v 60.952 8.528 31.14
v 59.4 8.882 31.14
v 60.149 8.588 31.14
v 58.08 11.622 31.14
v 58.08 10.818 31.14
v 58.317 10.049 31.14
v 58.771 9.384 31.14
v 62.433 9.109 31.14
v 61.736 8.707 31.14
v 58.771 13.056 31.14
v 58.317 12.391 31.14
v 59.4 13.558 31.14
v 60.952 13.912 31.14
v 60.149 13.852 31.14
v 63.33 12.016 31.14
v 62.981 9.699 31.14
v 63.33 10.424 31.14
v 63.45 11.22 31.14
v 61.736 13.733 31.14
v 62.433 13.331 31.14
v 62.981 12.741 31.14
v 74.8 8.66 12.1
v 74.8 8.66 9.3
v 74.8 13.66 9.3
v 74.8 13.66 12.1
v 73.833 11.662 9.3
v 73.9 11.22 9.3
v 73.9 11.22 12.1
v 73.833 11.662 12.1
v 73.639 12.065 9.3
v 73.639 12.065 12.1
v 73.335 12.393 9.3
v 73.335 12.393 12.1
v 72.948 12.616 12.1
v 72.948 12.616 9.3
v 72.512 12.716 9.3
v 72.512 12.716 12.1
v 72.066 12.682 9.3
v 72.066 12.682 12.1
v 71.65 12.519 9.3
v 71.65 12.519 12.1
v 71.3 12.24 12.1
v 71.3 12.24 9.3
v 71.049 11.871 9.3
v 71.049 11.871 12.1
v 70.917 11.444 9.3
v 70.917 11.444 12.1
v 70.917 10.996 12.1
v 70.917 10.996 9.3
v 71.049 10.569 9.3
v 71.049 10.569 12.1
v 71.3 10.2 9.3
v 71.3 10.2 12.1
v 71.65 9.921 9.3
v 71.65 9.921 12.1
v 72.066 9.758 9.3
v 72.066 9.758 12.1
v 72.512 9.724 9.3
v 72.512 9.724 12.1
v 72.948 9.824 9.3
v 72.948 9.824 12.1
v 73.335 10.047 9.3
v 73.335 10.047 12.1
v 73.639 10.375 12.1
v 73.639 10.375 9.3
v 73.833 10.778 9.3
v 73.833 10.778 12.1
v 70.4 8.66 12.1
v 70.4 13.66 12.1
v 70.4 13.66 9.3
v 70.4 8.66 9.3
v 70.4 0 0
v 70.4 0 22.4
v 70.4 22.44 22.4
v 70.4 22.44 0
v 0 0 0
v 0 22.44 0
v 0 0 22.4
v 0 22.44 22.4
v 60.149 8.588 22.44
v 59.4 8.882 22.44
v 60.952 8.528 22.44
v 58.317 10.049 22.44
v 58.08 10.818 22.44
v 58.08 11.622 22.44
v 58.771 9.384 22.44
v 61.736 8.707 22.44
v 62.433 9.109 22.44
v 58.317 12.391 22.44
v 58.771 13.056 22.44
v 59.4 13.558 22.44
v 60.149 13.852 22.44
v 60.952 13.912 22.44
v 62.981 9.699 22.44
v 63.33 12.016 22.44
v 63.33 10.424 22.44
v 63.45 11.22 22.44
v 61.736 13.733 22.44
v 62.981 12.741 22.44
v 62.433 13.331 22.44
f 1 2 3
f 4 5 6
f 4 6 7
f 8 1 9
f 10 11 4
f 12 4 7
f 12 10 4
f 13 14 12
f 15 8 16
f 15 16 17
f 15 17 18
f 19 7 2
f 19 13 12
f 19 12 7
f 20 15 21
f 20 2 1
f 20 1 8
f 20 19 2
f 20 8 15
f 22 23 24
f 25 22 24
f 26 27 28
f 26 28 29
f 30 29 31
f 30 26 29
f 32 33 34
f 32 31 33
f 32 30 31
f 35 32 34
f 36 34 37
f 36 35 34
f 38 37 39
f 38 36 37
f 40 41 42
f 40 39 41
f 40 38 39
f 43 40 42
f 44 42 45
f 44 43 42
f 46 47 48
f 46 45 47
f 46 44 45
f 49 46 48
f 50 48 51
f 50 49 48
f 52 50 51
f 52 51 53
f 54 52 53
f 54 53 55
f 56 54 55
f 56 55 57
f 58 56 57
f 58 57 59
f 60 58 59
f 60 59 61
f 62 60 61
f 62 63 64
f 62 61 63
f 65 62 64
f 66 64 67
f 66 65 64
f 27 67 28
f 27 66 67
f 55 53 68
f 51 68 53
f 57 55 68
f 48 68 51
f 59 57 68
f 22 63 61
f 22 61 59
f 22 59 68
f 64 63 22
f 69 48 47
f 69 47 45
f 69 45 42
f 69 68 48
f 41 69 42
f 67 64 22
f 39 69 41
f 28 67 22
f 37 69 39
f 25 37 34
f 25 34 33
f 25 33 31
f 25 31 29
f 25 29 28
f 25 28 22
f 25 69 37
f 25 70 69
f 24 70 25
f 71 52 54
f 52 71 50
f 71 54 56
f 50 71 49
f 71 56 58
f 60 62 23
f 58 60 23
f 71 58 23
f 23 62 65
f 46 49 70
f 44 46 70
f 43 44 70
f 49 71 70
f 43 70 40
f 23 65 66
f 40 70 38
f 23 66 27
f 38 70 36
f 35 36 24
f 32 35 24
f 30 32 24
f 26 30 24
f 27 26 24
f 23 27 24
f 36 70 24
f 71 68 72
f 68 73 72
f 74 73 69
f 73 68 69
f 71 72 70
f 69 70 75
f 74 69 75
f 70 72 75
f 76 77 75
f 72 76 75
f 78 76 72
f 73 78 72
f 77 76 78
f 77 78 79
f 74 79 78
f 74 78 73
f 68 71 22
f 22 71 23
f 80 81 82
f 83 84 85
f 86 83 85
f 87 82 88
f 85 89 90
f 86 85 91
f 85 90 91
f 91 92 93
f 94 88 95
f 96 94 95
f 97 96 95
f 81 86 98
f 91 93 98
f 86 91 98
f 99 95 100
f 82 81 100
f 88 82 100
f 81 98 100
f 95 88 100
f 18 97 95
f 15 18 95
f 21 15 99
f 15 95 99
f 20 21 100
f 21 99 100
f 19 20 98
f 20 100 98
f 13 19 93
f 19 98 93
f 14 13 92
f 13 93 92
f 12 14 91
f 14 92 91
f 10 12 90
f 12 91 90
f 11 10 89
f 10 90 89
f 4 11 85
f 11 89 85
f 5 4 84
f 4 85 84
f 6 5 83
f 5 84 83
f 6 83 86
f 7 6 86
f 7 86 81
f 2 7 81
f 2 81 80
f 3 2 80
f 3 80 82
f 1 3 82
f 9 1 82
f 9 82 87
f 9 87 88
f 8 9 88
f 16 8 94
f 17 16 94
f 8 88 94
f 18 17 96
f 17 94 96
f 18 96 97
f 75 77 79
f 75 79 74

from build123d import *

# Parameters (mm, degrees)
BOX_W             = 70.4
BOX_H             = 22.44
BOX_DEPTH         = 22.4
CYLINDER_R        = 1.5
CYLINDER_DEPTH    = 10
BOX001_W          = 4.8
BOX001_H          = 5
BOX001_DEPTH      = 2.8
CYLINDER001_R     = 2.7
CYLINDER001_DEPTH = 8.7


with BuildPart() as base:
    # Box → Box (new body)
    with BuildSketch(Plane.XY):
        with Locations((35.2, 11.22)):
            Rectangle(BOX_W, BOX_H)
    extrude(amount=BOX_DEPTH)


with BuildPart() as cylinder:
    # Cylinder → Cylinder (new body)
    with BuildSketch(Plane(origin=(72.4, 11.22, 8.3), x_dir=(1, 0, 0), z_dir=(0, 0, 1))):
        Circle(CYLINDER_R)
    extrude(amount=CYLINDER_DEPTH)


with BuildPart() as fusion:
    # Box001 → Box001 (new body)
    with BuildSketch(Plane(origin=(70, 8.66, 9.3), x_dir=(1, 0, 0), z_dir=(0, 0, 1))):
        with Locations((2.4, 2.5)):
            Rectangle(BOX001_W, BOX001_H)
    extrude(amount=BOX001_DEPTH)

    # Cut: cut Cylinder
    add(cylinder.part, mode=Mode.SUBTRACT)

    # Fusion: union Base
    add(base.part)


with BuildPart() as fusion001:
    # Cylinder001 → Cylinder001 (new body)
    with BuildSketch(Plane(origin=(60.75, 11.22, 22.44), x_dir=(1, 0, 0), z_dir=(0, 0, 1))):
        Circle(CYLINDER001_R)
    extrude(amount=CYLINDER001_DEPTH)

    # Fusion001: union Fusion
    add(fusion.part)


solid = fusion001.part
